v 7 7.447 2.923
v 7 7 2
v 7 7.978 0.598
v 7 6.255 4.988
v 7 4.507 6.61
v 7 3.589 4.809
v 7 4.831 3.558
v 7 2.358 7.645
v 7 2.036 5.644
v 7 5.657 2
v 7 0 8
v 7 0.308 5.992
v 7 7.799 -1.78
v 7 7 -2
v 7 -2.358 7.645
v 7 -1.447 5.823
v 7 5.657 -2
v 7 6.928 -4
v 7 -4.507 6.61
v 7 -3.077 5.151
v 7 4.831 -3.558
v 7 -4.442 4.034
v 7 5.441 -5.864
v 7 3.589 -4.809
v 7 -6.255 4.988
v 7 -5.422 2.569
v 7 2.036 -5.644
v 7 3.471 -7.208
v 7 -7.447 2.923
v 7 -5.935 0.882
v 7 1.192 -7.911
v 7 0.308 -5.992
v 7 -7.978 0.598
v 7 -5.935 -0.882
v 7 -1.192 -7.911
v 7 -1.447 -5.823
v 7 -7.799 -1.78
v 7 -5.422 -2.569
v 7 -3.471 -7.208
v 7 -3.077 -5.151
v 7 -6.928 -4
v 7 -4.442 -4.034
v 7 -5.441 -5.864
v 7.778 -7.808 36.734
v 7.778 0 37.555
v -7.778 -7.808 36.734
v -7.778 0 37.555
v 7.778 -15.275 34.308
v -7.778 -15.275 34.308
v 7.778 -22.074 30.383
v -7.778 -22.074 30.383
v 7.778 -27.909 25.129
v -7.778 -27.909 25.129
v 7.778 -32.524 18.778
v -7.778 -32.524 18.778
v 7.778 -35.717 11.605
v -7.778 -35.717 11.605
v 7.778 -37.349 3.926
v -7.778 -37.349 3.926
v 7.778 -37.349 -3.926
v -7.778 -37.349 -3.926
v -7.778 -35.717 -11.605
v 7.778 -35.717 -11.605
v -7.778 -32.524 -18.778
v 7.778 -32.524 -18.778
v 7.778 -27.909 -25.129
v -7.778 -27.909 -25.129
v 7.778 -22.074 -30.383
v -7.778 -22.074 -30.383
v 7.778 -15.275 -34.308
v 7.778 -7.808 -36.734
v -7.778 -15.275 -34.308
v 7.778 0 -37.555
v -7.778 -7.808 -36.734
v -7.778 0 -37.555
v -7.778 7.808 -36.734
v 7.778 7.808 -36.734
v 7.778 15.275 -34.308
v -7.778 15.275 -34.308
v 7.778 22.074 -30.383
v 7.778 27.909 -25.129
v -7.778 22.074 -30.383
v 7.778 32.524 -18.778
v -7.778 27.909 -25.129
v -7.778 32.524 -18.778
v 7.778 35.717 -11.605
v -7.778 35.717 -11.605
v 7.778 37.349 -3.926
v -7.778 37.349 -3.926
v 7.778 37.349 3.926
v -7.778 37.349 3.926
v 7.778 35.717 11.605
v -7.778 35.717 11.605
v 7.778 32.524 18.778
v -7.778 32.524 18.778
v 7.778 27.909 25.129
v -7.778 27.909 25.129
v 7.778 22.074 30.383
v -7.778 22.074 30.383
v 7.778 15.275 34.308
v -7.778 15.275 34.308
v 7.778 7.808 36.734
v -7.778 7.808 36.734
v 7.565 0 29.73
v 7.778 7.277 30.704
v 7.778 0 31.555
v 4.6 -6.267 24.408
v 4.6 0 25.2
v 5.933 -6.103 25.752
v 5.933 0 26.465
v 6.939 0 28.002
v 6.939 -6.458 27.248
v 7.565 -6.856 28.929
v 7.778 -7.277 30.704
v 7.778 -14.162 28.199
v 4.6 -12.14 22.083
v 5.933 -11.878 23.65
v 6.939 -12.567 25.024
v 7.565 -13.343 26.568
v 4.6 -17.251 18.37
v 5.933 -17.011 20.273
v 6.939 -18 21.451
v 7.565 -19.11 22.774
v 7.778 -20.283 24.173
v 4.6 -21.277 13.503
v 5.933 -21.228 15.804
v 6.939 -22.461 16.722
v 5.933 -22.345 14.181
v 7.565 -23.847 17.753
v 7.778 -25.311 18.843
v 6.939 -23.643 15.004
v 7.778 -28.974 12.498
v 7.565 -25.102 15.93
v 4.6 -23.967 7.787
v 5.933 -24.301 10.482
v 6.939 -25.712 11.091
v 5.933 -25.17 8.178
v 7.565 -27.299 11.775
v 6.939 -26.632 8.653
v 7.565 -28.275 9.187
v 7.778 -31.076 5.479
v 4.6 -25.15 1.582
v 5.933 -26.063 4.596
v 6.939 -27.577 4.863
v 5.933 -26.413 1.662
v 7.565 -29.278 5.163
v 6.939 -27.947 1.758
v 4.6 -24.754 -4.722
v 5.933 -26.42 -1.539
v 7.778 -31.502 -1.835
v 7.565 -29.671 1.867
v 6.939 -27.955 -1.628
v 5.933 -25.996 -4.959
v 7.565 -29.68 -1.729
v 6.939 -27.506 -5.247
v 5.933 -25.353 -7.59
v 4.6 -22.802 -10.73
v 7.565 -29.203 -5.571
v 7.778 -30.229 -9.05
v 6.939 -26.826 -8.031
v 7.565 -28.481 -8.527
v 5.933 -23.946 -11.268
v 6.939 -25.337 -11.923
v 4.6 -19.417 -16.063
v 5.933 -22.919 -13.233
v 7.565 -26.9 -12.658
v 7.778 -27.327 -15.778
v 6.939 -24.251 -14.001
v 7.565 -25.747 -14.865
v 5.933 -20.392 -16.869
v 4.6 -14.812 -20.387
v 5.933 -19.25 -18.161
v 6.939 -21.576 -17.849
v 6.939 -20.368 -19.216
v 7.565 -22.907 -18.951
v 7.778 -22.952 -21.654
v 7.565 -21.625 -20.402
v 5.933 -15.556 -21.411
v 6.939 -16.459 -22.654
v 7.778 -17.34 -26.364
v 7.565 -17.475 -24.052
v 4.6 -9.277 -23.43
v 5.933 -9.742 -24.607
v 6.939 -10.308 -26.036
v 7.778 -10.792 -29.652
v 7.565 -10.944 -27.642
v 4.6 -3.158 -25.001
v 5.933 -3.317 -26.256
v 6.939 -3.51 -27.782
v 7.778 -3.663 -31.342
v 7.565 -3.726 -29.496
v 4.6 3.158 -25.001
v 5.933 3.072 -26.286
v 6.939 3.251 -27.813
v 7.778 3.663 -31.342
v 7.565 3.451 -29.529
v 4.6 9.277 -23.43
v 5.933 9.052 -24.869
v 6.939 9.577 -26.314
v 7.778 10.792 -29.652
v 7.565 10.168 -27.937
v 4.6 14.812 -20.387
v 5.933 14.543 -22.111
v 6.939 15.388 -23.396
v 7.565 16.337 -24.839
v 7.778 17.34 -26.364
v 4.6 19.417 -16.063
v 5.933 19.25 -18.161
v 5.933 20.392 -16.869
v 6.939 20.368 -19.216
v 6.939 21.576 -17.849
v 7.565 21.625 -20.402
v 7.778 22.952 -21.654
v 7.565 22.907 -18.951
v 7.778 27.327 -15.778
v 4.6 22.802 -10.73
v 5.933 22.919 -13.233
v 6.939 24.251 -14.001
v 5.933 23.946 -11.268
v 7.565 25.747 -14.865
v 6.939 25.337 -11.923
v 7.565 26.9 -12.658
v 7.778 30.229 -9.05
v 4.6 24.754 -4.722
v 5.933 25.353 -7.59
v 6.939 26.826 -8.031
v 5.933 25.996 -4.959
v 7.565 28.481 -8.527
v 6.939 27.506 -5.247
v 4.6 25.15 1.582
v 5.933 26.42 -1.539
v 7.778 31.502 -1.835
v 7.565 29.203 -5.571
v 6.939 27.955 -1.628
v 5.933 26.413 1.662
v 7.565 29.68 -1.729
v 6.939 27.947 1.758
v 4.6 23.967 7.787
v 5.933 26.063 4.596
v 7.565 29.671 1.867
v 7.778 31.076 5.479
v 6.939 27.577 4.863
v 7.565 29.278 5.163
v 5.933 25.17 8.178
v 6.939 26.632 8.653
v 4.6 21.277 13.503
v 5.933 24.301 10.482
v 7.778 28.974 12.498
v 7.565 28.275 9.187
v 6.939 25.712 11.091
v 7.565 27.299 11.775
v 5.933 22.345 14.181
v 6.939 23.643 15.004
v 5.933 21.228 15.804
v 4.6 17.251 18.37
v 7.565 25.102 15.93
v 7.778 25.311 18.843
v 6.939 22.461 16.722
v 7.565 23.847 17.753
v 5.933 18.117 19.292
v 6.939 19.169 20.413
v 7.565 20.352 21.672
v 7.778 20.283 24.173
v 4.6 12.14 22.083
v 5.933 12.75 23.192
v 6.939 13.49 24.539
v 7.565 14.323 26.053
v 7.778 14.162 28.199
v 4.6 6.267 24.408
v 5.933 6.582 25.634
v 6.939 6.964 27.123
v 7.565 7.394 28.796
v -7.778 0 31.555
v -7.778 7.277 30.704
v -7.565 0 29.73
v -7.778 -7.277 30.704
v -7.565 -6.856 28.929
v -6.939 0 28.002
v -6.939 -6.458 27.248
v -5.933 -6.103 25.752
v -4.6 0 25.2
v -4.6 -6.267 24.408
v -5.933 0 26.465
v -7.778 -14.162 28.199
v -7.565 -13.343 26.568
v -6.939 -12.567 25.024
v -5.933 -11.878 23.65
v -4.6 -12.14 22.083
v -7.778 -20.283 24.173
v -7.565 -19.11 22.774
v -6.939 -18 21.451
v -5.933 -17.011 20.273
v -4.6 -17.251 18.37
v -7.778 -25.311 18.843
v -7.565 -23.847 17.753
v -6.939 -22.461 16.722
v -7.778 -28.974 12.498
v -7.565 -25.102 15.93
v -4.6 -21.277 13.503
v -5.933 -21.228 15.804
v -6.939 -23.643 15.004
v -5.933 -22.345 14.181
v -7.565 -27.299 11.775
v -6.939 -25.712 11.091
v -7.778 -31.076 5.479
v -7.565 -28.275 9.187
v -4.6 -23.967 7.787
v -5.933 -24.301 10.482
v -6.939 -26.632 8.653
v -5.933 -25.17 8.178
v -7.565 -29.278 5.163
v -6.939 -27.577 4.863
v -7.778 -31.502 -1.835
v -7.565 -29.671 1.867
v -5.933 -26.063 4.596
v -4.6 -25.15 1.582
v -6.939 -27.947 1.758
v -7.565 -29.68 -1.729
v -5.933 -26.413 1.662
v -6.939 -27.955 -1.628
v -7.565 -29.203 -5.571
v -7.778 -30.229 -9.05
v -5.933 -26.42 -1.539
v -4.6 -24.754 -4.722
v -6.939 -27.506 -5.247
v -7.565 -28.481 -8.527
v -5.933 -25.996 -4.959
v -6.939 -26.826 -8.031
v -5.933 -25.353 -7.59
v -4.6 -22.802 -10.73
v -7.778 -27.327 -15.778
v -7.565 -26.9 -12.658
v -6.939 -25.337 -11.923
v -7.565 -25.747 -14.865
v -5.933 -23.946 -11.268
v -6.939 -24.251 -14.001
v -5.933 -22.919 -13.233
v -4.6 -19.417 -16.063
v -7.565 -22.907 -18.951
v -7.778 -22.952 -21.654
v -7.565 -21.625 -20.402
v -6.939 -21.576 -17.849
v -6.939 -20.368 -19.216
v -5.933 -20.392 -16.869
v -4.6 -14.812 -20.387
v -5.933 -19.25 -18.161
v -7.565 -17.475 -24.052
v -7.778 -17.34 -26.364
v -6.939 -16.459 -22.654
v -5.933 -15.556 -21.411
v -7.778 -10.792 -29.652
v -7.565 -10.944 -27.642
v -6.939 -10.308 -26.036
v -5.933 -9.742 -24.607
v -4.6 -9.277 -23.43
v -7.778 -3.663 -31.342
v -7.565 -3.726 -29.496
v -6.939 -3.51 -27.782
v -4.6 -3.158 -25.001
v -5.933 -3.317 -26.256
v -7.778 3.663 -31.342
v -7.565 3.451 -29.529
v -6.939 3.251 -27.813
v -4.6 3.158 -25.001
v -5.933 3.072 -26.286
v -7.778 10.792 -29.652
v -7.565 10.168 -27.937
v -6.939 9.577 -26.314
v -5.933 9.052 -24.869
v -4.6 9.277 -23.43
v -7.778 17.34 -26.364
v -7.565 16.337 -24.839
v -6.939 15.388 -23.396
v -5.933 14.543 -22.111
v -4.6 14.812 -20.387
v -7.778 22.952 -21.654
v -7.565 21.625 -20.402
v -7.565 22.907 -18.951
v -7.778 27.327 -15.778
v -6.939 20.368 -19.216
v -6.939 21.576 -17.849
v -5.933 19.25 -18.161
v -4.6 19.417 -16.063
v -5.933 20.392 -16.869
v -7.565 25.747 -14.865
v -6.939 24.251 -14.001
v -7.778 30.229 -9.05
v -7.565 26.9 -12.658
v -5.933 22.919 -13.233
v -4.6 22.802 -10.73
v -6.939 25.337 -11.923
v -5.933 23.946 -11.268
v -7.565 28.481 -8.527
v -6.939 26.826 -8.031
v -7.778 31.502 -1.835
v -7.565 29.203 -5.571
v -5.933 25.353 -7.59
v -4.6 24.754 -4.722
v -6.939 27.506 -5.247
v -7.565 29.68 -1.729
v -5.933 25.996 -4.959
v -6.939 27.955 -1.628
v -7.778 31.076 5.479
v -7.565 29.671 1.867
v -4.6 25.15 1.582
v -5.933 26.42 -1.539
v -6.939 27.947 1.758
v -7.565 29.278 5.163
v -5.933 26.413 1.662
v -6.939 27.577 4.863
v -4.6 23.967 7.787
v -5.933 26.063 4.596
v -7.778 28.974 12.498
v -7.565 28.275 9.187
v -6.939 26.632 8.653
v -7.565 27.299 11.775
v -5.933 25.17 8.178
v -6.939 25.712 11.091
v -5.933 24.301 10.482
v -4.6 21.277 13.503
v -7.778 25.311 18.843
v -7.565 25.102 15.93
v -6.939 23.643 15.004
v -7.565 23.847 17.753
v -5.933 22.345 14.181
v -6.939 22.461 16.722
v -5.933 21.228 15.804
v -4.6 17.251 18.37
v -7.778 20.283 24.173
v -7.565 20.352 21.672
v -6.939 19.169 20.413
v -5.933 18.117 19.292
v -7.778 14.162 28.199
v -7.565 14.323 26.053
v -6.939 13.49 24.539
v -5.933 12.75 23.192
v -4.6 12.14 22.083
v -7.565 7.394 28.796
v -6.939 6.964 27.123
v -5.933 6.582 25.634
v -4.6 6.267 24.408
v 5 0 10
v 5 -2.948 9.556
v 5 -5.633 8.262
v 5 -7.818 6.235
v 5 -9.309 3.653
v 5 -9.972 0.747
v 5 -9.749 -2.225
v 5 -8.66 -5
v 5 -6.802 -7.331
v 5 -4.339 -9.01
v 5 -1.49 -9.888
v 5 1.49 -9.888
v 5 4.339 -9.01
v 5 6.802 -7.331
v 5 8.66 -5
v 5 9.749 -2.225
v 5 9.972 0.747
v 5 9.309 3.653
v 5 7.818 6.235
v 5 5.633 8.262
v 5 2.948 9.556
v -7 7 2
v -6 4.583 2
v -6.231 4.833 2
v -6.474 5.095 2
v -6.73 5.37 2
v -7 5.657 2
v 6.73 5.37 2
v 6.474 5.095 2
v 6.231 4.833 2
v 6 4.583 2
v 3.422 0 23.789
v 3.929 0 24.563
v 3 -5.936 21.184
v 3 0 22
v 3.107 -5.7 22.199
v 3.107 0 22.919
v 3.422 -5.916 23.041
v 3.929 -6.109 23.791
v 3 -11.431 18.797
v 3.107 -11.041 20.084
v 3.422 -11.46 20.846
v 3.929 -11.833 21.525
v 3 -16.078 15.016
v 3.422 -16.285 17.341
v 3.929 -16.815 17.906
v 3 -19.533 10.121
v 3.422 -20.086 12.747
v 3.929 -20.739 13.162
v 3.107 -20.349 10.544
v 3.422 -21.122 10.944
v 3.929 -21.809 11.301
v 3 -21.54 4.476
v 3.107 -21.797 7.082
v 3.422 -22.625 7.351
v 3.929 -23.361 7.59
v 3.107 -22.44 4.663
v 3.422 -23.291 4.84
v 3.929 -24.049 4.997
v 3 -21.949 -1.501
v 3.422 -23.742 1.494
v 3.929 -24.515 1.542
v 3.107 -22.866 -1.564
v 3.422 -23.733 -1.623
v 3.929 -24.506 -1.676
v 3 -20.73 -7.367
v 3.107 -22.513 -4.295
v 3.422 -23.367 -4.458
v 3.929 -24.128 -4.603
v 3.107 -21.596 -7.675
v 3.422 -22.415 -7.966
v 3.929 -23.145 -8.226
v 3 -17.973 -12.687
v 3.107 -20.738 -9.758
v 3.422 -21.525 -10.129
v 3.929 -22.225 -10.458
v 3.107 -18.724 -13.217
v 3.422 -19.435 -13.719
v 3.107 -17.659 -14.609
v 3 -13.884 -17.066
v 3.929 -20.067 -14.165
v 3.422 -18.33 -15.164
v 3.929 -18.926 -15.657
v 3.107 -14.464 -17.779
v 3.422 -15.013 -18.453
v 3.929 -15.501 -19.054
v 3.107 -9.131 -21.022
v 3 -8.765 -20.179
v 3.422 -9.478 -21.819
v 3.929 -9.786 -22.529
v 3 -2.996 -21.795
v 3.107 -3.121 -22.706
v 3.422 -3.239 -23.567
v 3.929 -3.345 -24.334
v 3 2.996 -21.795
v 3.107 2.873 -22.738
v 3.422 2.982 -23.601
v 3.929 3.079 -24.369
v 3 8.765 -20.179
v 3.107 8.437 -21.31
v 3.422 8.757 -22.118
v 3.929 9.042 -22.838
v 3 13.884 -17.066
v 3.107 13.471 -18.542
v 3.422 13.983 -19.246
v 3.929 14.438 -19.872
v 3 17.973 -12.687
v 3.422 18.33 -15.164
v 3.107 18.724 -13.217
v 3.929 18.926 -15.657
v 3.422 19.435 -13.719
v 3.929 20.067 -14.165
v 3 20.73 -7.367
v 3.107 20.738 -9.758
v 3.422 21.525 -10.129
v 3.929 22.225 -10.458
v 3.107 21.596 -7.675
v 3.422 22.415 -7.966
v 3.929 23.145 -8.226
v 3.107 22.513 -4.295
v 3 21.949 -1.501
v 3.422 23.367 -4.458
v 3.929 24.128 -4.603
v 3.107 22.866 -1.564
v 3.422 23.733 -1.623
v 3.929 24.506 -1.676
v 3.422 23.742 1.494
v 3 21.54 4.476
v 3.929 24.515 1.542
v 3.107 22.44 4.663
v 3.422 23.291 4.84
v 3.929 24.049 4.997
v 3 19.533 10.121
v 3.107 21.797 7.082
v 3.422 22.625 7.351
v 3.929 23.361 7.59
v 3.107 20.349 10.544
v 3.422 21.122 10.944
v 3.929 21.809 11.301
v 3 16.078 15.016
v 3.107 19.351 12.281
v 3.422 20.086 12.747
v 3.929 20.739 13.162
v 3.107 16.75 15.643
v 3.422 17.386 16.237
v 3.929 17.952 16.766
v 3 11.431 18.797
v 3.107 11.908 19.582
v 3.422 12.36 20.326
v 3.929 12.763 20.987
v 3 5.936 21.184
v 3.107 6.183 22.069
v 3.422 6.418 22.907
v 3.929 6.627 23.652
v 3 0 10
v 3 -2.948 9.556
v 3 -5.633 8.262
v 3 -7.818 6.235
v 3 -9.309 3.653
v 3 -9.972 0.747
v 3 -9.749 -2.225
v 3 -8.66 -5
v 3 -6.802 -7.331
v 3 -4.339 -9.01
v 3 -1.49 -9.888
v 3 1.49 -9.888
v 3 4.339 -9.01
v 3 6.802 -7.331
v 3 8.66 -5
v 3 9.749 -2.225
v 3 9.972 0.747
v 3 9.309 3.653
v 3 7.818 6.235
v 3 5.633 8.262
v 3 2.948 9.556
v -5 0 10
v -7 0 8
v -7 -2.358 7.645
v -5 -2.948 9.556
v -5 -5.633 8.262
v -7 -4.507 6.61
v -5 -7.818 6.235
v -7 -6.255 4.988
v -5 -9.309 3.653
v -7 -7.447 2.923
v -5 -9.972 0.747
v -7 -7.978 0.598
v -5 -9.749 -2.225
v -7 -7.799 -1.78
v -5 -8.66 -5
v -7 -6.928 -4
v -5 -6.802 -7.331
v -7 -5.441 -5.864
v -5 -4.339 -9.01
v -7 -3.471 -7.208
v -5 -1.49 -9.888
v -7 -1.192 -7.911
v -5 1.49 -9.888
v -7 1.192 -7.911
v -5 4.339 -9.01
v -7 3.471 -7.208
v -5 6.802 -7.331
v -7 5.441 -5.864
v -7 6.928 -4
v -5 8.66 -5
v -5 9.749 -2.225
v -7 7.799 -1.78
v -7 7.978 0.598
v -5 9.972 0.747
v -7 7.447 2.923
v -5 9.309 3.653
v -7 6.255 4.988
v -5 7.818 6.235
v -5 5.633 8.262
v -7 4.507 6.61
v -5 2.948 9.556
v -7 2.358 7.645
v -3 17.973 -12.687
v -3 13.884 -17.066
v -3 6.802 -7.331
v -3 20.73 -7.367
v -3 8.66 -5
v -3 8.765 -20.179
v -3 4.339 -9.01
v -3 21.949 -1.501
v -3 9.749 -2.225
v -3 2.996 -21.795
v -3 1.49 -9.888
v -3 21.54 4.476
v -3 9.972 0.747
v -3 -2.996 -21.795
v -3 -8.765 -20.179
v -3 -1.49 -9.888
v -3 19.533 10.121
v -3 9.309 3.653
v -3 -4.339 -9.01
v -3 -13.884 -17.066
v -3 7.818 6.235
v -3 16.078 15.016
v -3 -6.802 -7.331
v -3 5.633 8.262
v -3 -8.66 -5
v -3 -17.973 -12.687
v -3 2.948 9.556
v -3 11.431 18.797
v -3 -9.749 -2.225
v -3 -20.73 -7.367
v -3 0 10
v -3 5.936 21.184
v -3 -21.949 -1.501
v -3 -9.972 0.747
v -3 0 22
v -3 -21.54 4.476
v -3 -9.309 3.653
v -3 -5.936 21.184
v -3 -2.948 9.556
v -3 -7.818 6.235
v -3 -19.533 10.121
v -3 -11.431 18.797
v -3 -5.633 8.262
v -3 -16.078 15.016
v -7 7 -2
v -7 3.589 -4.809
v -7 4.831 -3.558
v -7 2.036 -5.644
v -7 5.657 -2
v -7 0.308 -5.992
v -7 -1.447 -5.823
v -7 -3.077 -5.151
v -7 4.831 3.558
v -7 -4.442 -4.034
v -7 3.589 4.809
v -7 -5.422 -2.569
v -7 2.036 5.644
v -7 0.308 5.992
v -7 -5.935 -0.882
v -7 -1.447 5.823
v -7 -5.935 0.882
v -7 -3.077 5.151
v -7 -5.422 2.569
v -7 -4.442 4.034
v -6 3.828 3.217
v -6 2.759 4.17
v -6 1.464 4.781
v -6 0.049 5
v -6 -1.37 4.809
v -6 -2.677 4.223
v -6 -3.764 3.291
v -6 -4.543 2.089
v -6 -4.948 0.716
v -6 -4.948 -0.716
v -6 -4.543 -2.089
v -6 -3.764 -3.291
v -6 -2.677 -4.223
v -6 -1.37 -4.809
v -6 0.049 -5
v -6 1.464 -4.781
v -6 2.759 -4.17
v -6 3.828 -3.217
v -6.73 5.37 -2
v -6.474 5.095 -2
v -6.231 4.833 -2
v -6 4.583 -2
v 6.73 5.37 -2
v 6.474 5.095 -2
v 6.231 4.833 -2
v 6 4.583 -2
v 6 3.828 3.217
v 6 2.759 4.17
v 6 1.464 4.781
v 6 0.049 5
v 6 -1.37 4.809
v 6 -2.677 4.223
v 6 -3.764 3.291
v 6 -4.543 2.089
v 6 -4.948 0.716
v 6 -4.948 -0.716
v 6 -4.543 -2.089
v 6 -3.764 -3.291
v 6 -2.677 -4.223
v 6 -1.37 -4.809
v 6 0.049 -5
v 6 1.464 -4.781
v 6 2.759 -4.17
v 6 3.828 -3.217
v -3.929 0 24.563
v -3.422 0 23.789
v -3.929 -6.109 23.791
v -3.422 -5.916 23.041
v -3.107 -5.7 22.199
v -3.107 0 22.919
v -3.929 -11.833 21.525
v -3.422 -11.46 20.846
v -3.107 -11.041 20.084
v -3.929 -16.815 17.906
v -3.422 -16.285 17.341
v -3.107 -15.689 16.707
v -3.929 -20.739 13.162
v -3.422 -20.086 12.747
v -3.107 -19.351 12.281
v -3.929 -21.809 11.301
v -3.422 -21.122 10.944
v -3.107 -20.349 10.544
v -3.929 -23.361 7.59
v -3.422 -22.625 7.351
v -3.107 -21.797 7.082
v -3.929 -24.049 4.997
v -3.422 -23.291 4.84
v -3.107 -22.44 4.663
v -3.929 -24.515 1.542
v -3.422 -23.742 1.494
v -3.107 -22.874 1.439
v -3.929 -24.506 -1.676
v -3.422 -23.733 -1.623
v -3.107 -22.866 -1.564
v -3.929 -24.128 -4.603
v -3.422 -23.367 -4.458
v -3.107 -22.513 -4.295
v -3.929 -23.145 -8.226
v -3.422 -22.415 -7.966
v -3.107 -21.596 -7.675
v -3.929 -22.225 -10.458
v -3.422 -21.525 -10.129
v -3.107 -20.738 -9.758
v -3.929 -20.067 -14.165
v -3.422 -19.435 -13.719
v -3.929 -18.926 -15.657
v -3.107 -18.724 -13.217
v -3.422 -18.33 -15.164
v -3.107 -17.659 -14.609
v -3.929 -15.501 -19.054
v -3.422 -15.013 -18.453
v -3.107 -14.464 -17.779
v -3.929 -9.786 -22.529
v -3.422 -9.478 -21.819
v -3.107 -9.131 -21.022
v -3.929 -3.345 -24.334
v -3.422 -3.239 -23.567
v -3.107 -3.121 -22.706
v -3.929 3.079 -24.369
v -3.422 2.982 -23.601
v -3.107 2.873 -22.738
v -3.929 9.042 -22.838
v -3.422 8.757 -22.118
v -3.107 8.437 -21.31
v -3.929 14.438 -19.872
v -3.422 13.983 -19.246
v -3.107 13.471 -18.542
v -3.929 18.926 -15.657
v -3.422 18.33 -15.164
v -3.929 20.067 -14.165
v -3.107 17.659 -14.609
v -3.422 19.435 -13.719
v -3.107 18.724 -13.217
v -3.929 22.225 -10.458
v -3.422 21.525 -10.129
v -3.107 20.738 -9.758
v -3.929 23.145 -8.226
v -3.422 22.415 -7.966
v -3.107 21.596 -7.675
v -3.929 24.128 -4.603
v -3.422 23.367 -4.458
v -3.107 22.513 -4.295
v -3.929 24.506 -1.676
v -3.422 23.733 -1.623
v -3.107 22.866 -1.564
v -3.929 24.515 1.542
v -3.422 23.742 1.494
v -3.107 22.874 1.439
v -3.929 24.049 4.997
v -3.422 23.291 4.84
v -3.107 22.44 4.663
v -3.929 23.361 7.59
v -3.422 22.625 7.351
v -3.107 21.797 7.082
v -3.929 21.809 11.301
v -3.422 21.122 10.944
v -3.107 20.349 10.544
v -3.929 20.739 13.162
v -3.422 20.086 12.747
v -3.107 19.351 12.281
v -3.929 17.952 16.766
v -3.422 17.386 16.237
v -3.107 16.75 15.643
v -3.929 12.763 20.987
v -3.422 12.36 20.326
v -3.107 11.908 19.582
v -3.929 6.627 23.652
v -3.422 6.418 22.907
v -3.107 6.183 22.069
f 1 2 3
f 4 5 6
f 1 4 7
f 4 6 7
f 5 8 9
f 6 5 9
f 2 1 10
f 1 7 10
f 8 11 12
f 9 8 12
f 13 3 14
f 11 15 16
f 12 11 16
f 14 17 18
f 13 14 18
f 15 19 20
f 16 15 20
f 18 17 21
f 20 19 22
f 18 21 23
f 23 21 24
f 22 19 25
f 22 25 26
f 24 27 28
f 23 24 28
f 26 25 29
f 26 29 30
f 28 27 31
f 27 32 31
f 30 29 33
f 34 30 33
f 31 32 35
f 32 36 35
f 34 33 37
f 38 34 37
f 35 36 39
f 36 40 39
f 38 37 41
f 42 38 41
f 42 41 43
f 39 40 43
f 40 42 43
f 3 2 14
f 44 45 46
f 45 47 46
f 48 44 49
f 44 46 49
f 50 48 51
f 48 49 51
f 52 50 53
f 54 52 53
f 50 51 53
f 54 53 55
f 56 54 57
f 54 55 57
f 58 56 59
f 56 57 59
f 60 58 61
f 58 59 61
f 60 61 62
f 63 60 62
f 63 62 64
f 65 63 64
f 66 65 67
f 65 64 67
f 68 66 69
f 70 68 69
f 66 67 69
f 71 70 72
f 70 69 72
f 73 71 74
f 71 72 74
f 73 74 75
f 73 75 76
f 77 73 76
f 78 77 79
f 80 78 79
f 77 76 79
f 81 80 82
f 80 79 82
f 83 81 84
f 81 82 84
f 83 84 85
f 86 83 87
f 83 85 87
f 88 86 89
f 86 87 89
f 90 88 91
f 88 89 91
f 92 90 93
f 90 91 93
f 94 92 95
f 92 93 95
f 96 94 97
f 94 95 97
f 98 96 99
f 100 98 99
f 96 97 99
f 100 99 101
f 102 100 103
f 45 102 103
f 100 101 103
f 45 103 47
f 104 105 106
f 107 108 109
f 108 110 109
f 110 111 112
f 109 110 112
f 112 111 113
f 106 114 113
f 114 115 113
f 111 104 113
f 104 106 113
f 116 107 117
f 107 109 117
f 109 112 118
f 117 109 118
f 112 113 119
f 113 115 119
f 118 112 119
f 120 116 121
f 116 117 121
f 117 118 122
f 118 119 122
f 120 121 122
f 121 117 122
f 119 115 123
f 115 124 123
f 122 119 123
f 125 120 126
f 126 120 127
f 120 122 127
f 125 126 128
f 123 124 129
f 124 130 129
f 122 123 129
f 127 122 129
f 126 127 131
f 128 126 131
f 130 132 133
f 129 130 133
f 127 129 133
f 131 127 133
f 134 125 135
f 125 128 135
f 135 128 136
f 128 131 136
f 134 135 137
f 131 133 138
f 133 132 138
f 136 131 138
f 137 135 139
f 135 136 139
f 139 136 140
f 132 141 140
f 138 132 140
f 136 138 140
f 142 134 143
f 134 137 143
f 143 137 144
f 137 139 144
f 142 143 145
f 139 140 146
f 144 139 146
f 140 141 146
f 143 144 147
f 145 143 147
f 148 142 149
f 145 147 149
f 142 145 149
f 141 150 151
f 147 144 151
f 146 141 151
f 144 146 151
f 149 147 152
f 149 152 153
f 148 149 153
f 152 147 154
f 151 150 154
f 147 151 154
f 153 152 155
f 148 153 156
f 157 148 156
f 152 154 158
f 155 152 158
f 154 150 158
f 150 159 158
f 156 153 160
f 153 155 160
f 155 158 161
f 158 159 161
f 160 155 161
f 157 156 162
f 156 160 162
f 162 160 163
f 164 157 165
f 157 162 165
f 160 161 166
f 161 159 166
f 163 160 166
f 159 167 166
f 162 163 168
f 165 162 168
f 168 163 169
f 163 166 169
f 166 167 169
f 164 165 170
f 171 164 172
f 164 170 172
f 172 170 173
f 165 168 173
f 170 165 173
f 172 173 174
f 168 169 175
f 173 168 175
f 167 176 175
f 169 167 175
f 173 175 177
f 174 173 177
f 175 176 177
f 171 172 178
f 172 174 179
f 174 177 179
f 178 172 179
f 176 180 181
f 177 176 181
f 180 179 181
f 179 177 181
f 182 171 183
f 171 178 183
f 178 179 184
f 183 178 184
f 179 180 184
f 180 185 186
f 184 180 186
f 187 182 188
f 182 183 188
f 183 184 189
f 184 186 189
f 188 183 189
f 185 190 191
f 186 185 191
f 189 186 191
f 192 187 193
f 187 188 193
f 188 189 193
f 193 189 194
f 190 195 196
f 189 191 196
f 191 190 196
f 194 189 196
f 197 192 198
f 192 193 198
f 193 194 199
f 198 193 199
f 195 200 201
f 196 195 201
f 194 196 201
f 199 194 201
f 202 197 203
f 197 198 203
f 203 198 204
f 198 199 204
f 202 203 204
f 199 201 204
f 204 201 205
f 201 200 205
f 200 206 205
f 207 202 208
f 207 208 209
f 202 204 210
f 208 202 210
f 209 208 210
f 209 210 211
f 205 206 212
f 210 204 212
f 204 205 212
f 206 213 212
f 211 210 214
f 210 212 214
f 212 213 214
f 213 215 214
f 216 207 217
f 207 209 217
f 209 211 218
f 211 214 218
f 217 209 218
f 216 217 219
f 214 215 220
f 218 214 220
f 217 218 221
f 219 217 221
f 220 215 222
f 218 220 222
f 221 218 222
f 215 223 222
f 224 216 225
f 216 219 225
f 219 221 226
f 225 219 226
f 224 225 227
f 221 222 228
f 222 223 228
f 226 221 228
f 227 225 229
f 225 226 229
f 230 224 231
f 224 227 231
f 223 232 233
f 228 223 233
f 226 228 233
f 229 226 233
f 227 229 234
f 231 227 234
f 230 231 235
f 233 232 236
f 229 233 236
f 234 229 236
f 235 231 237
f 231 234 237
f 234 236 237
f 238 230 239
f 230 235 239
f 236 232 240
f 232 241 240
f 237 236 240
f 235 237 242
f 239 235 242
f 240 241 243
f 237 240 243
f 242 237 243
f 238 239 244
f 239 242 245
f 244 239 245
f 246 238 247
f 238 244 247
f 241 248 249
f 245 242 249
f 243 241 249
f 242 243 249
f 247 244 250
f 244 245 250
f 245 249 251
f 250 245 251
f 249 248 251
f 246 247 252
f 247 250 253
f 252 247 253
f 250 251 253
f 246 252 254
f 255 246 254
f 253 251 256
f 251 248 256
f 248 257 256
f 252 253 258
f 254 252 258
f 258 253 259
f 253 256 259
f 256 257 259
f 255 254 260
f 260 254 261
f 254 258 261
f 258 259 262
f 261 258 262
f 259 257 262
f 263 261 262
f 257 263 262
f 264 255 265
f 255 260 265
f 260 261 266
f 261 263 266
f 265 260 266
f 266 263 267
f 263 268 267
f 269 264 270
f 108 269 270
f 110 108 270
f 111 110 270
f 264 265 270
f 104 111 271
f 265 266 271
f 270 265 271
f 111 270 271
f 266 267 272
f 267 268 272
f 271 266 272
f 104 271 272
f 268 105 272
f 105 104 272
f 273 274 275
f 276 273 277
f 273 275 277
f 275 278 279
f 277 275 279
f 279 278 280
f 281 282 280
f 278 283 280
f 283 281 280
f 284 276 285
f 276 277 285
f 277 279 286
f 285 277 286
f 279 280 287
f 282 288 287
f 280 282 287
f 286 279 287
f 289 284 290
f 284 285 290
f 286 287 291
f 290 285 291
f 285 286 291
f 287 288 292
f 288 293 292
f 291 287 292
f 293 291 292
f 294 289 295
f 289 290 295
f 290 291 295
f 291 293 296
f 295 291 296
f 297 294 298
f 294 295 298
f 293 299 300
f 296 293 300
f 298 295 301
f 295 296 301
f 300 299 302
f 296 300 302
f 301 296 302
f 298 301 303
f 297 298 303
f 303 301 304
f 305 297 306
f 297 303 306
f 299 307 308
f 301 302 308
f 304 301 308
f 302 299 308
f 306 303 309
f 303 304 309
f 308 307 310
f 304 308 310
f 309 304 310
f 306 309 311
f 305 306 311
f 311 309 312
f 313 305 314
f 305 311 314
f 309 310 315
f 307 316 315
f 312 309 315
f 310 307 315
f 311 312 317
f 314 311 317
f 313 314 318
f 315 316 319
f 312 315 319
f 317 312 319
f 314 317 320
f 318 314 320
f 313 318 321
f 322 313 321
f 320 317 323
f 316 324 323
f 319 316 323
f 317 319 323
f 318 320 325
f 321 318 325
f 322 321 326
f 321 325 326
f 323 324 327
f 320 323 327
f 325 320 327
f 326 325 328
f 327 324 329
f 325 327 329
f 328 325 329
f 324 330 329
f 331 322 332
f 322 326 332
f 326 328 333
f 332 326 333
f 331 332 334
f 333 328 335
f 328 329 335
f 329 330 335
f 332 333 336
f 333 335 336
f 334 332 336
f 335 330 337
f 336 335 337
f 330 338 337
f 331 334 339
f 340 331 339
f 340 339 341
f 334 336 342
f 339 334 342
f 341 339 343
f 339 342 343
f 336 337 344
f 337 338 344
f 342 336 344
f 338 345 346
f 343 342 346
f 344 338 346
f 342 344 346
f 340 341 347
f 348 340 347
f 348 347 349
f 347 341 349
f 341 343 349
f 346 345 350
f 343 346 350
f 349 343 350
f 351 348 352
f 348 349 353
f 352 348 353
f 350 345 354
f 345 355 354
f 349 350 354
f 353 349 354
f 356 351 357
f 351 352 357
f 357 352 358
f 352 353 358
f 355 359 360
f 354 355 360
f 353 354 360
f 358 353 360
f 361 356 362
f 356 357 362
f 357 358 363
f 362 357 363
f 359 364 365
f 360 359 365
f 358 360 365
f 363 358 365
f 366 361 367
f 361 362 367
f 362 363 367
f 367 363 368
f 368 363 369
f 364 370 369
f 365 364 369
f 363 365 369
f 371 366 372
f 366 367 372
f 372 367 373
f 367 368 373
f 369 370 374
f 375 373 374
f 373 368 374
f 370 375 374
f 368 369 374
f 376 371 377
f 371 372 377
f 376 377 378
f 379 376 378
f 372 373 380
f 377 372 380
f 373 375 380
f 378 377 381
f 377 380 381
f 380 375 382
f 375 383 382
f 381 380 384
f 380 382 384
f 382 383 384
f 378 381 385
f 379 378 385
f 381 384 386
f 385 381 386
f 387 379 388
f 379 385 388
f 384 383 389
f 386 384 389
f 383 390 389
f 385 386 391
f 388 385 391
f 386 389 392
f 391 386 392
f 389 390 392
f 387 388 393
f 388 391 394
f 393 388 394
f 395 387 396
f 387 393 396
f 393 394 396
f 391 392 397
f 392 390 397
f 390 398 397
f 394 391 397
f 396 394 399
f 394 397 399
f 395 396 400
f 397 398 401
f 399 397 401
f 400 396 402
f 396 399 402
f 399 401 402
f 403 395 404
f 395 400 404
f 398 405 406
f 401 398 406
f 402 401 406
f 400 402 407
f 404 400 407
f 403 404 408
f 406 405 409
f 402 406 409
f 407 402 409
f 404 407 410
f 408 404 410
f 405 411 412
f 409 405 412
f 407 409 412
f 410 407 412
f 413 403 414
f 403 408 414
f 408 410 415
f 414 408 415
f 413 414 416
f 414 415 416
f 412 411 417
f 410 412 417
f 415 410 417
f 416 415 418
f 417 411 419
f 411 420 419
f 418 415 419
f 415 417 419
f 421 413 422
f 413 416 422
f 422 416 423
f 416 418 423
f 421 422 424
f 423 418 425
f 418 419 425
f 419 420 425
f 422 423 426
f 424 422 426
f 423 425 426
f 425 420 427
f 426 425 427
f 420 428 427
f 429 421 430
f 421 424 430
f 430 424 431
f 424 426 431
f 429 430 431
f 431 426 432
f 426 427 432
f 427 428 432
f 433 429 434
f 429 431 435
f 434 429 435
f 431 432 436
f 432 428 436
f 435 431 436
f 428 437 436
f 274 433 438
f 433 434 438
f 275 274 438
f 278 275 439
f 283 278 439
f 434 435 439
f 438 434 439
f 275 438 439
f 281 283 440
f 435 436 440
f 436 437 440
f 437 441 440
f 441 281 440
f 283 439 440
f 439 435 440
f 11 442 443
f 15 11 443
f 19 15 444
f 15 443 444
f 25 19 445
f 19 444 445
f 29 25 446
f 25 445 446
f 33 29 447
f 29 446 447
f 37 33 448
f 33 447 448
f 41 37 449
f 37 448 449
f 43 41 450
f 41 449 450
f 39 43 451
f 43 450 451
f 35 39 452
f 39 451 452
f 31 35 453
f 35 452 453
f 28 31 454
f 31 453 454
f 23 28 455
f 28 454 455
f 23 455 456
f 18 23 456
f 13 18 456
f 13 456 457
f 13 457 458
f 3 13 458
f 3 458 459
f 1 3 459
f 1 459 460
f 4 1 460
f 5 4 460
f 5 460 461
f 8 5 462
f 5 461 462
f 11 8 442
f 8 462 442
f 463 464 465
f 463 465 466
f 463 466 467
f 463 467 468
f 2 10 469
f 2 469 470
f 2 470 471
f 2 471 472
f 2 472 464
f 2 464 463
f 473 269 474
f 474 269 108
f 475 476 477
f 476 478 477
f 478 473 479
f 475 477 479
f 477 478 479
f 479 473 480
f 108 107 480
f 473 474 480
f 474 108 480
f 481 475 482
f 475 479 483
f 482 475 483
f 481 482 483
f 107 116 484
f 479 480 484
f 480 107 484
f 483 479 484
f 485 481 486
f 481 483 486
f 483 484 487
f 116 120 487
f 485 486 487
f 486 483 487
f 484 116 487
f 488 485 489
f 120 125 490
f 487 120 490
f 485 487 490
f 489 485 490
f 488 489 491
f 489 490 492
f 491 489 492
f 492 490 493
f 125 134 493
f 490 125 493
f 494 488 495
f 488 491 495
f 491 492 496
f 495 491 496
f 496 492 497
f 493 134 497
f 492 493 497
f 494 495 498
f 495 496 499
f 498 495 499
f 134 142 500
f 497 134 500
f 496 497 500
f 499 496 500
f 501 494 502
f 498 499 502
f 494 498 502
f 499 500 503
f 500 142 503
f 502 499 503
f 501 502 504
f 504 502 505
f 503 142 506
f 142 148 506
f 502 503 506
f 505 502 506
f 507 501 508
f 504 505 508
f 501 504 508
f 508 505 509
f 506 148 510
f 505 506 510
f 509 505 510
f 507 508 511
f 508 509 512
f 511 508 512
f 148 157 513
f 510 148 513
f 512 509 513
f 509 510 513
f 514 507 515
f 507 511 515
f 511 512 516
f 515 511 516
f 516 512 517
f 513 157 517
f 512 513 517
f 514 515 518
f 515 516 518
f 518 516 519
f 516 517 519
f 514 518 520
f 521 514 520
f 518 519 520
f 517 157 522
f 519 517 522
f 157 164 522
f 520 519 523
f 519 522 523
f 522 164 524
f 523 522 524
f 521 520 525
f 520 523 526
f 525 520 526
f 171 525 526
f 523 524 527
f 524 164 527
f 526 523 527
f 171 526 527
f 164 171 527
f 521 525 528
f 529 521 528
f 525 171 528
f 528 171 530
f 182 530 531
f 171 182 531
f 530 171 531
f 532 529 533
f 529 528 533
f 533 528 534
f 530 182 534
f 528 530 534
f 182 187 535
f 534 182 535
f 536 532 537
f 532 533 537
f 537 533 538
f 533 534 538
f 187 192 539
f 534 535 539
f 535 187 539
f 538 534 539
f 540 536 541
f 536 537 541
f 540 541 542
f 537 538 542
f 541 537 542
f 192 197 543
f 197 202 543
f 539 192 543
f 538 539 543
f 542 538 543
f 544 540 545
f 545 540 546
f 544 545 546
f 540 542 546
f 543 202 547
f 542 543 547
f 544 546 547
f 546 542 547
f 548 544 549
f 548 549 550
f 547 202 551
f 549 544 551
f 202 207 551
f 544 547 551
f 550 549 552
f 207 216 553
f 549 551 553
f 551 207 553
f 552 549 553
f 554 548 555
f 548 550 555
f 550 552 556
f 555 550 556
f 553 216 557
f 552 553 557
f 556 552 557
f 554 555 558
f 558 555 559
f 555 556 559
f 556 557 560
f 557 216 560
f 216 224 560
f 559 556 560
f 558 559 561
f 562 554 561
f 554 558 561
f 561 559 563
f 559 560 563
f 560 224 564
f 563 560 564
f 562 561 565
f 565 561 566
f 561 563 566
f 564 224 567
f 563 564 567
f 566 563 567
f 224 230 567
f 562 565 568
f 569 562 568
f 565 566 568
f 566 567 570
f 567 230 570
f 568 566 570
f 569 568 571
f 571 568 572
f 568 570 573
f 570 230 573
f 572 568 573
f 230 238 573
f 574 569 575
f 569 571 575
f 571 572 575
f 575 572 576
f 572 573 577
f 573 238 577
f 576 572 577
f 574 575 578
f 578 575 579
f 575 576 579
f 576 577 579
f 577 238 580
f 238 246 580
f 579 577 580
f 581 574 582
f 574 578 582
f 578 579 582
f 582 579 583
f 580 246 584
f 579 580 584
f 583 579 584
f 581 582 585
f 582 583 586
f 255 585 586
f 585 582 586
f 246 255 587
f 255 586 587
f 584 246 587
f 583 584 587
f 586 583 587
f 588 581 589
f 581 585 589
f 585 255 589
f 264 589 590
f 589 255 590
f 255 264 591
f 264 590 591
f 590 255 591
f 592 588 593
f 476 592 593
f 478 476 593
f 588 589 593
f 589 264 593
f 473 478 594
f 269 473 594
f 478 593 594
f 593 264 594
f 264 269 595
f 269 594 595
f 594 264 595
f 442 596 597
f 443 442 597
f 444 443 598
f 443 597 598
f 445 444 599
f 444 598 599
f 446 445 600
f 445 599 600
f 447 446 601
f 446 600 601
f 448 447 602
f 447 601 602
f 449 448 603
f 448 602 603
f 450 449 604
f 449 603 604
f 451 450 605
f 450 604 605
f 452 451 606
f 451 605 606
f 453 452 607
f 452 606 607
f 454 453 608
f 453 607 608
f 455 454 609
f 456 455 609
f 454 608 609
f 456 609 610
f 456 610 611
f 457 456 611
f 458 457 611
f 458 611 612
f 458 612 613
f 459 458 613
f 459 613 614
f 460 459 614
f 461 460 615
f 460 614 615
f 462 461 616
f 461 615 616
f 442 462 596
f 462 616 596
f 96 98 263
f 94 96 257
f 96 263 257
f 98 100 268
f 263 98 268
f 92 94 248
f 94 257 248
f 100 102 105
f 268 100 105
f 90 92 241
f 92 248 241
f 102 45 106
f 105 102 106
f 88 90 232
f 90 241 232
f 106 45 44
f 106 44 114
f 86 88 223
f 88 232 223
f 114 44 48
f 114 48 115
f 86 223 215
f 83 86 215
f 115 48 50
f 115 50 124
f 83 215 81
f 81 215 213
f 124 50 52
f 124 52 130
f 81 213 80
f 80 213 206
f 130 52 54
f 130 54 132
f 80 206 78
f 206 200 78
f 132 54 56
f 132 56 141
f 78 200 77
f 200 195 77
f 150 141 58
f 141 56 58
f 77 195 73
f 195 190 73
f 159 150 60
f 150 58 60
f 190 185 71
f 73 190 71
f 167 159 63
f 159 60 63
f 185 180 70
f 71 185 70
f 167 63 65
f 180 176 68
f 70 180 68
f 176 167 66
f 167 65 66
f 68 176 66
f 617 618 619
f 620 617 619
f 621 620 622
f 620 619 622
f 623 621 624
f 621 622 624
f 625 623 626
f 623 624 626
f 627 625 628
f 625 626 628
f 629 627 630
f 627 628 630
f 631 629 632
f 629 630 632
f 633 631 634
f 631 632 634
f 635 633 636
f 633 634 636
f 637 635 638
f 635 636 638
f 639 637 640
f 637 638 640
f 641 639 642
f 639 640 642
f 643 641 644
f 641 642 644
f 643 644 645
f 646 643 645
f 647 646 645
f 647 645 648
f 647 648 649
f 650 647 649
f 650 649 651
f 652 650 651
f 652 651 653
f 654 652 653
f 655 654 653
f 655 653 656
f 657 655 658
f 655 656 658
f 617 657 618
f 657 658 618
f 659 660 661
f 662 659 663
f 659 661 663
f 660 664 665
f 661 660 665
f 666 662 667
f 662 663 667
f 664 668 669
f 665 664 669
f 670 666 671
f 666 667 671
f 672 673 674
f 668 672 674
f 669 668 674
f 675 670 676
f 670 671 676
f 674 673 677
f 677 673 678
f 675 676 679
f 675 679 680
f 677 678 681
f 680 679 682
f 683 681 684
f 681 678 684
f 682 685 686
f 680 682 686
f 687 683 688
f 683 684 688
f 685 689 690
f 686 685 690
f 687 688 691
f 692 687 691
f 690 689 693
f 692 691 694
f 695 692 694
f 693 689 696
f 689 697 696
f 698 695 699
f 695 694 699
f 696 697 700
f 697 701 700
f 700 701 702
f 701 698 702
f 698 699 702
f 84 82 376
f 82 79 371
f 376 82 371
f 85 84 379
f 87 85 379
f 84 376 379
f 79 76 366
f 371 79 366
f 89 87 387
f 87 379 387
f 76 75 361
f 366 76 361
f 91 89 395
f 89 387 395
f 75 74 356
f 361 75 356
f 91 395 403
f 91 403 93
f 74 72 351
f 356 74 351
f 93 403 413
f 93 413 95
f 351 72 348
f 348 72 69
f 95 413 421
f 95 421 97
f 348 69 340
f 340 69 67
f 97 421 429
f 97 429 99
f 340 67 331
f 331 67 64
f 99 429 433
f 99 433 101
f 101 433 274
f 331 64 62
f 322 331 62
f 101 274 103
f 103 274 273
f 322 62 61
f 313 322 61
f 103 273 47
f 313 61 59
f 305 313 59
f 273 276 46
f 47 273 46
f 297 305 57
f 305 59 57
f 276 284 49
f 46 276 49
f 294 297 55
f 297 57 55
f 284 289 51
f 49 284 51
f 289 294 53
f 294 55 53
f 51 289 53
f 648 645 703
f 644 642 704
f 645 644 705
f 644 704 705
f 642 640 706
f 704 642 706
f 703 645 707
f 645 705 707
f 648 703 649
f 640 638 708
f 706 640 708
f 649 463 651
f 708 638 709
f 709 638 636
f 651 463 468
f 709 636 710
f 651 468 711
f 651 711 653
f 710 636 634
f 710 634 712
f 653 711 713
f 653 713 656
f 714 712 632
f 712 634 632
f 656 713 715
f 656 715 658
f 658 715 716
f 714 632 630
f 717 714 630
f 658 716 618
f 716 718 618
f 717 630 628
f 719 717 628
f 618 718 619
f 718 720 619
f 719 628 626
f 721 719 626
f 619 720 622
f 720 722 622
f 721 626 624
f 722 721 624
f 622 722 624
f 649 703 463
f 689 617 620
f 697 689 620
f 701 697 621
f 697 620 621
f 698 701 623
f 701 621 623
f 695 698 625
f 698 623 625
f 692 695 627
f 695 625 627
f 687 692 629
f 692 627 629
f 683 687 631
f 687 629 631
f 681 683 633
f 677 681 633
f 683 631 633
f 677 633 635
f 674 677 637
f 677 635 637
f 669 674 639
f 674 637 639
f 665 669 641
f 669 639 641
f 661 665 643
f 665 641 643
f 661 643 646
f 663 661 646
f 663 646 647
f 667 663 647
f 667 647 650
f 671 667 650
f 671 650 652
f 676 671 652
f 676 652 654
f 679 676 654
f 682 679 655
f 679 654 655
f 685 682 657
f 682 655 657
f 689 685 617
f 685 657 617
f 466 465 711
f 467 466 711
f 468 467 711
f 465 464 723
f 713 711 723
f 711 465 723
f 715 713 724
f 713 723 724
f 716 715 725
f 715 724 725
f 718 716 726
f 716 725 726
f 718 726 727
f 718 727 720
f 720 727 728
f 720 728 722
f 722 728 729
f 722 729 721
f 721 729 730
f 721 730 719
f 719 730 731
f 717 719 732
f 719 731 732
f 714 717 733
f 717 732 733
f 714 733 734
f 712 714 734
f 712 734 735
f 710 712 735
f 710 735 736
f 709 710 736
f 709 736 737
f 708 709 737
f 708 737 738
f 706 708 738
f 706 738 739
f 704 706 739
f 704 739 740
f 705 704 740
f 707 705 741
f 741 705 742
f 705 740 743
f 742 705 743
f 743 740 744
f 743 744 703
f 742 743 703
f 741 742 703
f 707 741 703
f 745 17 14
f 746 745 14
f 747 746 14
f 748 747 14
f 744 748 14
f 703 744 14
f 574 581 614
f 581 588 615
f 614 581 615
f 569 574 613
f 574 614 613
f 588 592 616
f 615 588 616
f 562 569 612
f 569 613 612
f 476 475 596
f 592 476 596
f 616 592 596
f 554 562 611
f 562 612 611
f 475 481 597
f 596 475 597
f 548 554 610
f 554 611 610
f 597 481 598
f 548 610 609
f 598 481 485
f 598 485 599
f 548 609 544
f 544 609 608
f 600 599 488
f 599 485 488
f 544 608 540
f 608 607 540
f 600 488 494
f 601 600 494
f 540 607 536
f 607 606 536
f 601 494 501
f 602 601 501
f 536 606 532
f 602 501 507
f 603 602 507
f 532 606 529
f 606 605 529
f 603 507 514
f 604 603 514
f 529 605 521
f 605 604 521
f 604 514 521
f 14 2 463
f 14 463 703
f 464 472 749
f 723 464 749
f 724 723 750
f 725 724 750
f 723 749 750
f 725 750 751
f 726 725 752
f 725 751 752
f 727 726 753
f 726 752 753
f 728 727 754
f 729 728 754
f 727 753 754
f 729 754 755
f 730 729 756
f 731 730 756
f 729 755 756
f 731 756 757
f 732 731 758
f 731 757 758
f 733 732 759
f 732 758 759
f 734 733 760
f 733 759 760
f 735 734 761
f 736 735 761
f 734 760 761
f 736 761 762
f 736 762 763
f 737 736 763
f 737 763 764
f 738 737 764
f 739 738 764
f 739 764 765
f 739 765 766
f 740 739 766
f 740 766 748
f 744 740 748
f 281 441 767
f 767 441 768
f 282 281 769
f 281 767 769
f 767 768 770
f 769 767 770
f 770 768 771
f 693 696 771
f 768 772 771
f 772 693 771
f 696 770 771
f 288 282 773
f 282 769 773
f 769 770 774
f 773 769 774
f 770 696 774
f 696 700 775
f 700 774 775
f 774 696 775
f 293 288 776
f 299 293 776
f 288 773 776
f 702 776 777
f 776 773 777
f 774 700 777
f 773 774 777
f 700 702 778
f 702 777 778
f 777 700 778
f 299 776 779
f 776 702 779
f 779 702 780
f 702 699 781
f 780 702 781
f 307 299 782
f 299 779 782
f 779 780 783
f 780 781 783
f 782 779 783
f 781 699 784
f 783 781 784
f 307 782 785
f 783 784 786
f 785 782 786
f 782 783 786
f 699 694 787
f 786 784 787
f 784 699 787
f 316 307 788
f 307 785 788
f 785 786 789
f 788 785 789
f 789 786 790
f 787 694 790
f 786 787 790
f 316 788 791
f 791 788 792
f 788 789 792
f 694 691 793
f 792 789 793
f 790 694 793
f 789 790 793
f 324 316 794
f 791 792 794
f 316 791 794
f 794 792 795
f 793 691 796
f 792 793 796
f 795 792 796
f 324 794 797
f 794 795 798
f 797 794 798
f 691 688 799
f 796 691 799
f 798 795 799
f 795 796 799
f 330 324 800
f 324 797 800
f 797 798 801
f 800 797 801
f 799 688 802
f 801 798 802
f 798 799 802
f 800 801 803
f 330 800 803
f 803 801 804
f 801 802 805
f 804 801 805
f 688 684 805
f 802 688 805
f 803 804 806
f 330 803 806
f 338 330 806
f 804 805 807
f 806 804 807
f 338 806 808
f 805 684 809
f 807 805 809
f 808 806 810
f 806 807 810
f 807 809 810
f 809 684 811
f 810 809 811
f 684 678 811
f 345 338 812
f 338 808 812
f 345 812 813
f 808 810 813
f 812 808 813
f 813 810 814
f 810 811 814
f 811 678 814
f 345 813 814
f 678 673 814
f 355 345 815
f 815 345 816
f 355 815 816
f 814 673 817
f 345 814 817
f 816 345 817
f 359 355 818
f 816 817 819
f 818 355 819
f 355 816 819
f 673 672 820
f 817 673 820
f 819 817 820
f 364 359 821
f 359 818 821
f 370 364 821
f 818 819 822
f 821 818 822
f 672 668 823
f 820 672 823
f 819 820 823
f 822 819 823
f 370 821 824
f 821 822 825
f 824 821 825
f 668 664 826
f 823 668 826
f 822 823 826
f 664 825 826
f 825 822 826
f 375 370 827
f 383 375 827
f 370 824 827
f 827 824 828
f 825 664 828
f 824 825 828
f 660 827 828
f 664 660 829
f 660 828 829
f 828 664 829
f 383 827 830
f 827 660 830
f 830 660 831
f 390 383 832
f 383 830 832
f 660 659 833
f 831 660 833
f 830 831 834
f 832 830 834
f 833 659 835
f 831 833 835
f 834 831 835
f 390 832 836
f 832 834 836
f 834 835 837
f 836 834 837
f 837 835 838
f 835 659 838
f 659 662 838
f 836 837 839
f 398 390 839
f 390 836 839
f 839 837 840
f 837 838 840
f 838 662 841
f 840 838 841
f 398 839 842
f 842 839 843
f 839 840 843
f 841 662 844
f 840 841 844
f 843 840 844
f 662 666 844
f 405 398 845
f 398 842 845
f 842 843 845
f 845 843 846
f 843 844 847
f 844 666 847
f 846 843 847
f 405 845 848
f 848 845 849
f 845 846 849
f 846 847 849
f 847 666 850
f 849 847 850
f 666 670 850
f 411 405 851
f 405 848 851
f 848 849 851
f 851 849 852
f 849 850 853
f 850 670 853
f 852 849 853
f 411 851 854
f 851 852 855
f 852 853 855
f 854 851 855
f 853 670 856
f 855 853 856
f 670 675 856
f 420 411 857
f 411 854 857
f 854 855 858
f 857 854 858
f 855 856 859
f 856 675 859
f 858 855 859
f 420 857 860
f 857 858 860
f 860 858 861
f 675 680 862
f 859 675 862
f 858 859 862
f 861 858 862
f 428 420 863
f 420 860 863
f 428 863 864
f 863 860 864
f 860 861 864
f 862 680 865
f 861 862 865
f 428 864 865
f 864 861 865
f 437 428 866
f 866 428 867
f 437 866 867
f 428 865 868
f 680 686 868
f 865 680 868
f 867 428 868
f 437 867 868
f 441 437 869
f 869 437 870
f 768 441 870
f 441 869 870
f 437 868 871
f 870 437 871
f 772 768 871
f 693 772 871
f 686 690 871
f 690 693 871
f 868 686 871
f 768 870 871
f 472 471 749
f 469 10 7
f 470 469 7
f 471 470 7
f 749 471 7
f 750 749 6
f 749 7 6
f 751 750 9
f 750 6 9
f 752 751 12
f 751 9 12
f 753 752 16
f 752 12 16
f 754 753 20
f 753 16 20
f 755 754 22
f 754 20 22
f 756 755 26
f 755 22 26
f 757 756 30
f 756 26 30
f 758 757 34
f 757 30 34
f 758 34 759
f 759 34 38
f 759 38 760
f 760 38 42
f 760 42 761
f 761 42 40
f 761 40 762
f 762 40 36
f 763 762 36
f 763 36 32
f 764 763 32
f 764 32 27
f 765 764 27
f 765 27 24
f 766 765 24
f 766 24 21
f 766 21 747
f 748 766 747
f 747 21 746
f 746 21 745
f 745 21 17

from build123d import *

# Parameters (mm, degrees)
SFAZOWANIE1_SIZE           = 2
SFAZOWANIE2_SIZE           = 2
OTW_R_10_0_10_1_D          = 10
SFAZOWANIE3_SIZE           = 1
SZKIC4_W                   = 4
SZKIC4_H                   = 4
WYTNIJ_WYCI_GNI_CIE1_DEPTH = 15.777533215


with BuildPart() as part:
    # Szkic1 → Obrót1 (revolve)
    with BuildSketch(Plane.XY, mode=Mode.PRIVATE) as obr_t1_sk:
        with BuildLine():
            Line((-7.777533215, 37.555066431), (-7.777533215, 31.555066431))
            ThreePointArc((-7.777533215, 31.555066431), (-6.938880447, 28.002476296), (-4.6, 25.2))
            ThreePointArc((-4.6, 25.2), (-3.422291236, 23.788854382), (-3, 22))
            Line((-3, 22), (-3, 10))
            Line((-3, 10), (-7, 10))
            Line((-7, 10), (-7, 0))
            Line((-7, 0), (7, 0))
            Line((7, 0), (7, 10))
            Line((7, 10), (3, 10))
            Line((3, 10), (3, 22))
            ThreePointArc((3, 22), (3.422291236, 23.788854382), (4.6, 25.2))
            ThreePointArc((4.6, 25.2), (6.938880447, 28.002476296), (7.777533215, 31.555066431))
            Line((7.777533215, 31.555066431), (7.777533215, 37.555066431))
            Line((7.777533215, 37.555066431), (-7.777533215, 37.555066431))
        make_face()
    revolve(obr_t1_sk.sketch.rotate(Axis((-1.77338341, 0, 0), (1, 0, 0)), 90), axis=Axis((-1.77338341, 0, 0), (1, 0, 0)))  # turned: the seam where the file's is

    # Sfazowanie1
    sfazowanie1_edges = [part.edges().sort_by_distance(p)[0] for p in [
        (7, 0, -10),
    ]]
    chamfer(sfazowanie1_edges, length=SFAZOWANIE1_SIZE)

    # Sfazowanie2
    sfazowanie2_edges = [part.edges().sort_by_distance(p)[0] for p in [
        (-7, 0, -10),
    ]]
    chamfer(sfazowanie2_edges, length=SFAZOWANIE2_SIZE)

    # Otwór Ø10.0 (10)1 (through all)
    with Locations(Plane.ZY.offset(7)):
        with Locations((0, 0)):
            Hole(OTW_R_10_0_10_1_D / 2)

    # Sfazowanie3
    sfazowanie3_edges = [part.edges().sort_by_distance(p)[0] for p in [
        (7, 0, 5),
        (-7, 0, 5),
    ]]
    chamfer(sfazowanie3_edges, length=SFAZOWANIE3_SIZE)

    # Szkic4 → Wytnij-wyciągnięcie1 (cut, through all)
    with BuildSketch(Plane(origin=(7, 0, 0), x_dir=(0, 0, -1), z_dir=(1, 0, 0))):
        with Locations((0, 5)):
            Rectangle(SZKIC4_W, SZKIC4_H)
    extrude(amount=-WYTNIJ_WYCI_GNI_CIE1_DEPTH, mode=Mode.SUBTRACT)


solid = part.part
